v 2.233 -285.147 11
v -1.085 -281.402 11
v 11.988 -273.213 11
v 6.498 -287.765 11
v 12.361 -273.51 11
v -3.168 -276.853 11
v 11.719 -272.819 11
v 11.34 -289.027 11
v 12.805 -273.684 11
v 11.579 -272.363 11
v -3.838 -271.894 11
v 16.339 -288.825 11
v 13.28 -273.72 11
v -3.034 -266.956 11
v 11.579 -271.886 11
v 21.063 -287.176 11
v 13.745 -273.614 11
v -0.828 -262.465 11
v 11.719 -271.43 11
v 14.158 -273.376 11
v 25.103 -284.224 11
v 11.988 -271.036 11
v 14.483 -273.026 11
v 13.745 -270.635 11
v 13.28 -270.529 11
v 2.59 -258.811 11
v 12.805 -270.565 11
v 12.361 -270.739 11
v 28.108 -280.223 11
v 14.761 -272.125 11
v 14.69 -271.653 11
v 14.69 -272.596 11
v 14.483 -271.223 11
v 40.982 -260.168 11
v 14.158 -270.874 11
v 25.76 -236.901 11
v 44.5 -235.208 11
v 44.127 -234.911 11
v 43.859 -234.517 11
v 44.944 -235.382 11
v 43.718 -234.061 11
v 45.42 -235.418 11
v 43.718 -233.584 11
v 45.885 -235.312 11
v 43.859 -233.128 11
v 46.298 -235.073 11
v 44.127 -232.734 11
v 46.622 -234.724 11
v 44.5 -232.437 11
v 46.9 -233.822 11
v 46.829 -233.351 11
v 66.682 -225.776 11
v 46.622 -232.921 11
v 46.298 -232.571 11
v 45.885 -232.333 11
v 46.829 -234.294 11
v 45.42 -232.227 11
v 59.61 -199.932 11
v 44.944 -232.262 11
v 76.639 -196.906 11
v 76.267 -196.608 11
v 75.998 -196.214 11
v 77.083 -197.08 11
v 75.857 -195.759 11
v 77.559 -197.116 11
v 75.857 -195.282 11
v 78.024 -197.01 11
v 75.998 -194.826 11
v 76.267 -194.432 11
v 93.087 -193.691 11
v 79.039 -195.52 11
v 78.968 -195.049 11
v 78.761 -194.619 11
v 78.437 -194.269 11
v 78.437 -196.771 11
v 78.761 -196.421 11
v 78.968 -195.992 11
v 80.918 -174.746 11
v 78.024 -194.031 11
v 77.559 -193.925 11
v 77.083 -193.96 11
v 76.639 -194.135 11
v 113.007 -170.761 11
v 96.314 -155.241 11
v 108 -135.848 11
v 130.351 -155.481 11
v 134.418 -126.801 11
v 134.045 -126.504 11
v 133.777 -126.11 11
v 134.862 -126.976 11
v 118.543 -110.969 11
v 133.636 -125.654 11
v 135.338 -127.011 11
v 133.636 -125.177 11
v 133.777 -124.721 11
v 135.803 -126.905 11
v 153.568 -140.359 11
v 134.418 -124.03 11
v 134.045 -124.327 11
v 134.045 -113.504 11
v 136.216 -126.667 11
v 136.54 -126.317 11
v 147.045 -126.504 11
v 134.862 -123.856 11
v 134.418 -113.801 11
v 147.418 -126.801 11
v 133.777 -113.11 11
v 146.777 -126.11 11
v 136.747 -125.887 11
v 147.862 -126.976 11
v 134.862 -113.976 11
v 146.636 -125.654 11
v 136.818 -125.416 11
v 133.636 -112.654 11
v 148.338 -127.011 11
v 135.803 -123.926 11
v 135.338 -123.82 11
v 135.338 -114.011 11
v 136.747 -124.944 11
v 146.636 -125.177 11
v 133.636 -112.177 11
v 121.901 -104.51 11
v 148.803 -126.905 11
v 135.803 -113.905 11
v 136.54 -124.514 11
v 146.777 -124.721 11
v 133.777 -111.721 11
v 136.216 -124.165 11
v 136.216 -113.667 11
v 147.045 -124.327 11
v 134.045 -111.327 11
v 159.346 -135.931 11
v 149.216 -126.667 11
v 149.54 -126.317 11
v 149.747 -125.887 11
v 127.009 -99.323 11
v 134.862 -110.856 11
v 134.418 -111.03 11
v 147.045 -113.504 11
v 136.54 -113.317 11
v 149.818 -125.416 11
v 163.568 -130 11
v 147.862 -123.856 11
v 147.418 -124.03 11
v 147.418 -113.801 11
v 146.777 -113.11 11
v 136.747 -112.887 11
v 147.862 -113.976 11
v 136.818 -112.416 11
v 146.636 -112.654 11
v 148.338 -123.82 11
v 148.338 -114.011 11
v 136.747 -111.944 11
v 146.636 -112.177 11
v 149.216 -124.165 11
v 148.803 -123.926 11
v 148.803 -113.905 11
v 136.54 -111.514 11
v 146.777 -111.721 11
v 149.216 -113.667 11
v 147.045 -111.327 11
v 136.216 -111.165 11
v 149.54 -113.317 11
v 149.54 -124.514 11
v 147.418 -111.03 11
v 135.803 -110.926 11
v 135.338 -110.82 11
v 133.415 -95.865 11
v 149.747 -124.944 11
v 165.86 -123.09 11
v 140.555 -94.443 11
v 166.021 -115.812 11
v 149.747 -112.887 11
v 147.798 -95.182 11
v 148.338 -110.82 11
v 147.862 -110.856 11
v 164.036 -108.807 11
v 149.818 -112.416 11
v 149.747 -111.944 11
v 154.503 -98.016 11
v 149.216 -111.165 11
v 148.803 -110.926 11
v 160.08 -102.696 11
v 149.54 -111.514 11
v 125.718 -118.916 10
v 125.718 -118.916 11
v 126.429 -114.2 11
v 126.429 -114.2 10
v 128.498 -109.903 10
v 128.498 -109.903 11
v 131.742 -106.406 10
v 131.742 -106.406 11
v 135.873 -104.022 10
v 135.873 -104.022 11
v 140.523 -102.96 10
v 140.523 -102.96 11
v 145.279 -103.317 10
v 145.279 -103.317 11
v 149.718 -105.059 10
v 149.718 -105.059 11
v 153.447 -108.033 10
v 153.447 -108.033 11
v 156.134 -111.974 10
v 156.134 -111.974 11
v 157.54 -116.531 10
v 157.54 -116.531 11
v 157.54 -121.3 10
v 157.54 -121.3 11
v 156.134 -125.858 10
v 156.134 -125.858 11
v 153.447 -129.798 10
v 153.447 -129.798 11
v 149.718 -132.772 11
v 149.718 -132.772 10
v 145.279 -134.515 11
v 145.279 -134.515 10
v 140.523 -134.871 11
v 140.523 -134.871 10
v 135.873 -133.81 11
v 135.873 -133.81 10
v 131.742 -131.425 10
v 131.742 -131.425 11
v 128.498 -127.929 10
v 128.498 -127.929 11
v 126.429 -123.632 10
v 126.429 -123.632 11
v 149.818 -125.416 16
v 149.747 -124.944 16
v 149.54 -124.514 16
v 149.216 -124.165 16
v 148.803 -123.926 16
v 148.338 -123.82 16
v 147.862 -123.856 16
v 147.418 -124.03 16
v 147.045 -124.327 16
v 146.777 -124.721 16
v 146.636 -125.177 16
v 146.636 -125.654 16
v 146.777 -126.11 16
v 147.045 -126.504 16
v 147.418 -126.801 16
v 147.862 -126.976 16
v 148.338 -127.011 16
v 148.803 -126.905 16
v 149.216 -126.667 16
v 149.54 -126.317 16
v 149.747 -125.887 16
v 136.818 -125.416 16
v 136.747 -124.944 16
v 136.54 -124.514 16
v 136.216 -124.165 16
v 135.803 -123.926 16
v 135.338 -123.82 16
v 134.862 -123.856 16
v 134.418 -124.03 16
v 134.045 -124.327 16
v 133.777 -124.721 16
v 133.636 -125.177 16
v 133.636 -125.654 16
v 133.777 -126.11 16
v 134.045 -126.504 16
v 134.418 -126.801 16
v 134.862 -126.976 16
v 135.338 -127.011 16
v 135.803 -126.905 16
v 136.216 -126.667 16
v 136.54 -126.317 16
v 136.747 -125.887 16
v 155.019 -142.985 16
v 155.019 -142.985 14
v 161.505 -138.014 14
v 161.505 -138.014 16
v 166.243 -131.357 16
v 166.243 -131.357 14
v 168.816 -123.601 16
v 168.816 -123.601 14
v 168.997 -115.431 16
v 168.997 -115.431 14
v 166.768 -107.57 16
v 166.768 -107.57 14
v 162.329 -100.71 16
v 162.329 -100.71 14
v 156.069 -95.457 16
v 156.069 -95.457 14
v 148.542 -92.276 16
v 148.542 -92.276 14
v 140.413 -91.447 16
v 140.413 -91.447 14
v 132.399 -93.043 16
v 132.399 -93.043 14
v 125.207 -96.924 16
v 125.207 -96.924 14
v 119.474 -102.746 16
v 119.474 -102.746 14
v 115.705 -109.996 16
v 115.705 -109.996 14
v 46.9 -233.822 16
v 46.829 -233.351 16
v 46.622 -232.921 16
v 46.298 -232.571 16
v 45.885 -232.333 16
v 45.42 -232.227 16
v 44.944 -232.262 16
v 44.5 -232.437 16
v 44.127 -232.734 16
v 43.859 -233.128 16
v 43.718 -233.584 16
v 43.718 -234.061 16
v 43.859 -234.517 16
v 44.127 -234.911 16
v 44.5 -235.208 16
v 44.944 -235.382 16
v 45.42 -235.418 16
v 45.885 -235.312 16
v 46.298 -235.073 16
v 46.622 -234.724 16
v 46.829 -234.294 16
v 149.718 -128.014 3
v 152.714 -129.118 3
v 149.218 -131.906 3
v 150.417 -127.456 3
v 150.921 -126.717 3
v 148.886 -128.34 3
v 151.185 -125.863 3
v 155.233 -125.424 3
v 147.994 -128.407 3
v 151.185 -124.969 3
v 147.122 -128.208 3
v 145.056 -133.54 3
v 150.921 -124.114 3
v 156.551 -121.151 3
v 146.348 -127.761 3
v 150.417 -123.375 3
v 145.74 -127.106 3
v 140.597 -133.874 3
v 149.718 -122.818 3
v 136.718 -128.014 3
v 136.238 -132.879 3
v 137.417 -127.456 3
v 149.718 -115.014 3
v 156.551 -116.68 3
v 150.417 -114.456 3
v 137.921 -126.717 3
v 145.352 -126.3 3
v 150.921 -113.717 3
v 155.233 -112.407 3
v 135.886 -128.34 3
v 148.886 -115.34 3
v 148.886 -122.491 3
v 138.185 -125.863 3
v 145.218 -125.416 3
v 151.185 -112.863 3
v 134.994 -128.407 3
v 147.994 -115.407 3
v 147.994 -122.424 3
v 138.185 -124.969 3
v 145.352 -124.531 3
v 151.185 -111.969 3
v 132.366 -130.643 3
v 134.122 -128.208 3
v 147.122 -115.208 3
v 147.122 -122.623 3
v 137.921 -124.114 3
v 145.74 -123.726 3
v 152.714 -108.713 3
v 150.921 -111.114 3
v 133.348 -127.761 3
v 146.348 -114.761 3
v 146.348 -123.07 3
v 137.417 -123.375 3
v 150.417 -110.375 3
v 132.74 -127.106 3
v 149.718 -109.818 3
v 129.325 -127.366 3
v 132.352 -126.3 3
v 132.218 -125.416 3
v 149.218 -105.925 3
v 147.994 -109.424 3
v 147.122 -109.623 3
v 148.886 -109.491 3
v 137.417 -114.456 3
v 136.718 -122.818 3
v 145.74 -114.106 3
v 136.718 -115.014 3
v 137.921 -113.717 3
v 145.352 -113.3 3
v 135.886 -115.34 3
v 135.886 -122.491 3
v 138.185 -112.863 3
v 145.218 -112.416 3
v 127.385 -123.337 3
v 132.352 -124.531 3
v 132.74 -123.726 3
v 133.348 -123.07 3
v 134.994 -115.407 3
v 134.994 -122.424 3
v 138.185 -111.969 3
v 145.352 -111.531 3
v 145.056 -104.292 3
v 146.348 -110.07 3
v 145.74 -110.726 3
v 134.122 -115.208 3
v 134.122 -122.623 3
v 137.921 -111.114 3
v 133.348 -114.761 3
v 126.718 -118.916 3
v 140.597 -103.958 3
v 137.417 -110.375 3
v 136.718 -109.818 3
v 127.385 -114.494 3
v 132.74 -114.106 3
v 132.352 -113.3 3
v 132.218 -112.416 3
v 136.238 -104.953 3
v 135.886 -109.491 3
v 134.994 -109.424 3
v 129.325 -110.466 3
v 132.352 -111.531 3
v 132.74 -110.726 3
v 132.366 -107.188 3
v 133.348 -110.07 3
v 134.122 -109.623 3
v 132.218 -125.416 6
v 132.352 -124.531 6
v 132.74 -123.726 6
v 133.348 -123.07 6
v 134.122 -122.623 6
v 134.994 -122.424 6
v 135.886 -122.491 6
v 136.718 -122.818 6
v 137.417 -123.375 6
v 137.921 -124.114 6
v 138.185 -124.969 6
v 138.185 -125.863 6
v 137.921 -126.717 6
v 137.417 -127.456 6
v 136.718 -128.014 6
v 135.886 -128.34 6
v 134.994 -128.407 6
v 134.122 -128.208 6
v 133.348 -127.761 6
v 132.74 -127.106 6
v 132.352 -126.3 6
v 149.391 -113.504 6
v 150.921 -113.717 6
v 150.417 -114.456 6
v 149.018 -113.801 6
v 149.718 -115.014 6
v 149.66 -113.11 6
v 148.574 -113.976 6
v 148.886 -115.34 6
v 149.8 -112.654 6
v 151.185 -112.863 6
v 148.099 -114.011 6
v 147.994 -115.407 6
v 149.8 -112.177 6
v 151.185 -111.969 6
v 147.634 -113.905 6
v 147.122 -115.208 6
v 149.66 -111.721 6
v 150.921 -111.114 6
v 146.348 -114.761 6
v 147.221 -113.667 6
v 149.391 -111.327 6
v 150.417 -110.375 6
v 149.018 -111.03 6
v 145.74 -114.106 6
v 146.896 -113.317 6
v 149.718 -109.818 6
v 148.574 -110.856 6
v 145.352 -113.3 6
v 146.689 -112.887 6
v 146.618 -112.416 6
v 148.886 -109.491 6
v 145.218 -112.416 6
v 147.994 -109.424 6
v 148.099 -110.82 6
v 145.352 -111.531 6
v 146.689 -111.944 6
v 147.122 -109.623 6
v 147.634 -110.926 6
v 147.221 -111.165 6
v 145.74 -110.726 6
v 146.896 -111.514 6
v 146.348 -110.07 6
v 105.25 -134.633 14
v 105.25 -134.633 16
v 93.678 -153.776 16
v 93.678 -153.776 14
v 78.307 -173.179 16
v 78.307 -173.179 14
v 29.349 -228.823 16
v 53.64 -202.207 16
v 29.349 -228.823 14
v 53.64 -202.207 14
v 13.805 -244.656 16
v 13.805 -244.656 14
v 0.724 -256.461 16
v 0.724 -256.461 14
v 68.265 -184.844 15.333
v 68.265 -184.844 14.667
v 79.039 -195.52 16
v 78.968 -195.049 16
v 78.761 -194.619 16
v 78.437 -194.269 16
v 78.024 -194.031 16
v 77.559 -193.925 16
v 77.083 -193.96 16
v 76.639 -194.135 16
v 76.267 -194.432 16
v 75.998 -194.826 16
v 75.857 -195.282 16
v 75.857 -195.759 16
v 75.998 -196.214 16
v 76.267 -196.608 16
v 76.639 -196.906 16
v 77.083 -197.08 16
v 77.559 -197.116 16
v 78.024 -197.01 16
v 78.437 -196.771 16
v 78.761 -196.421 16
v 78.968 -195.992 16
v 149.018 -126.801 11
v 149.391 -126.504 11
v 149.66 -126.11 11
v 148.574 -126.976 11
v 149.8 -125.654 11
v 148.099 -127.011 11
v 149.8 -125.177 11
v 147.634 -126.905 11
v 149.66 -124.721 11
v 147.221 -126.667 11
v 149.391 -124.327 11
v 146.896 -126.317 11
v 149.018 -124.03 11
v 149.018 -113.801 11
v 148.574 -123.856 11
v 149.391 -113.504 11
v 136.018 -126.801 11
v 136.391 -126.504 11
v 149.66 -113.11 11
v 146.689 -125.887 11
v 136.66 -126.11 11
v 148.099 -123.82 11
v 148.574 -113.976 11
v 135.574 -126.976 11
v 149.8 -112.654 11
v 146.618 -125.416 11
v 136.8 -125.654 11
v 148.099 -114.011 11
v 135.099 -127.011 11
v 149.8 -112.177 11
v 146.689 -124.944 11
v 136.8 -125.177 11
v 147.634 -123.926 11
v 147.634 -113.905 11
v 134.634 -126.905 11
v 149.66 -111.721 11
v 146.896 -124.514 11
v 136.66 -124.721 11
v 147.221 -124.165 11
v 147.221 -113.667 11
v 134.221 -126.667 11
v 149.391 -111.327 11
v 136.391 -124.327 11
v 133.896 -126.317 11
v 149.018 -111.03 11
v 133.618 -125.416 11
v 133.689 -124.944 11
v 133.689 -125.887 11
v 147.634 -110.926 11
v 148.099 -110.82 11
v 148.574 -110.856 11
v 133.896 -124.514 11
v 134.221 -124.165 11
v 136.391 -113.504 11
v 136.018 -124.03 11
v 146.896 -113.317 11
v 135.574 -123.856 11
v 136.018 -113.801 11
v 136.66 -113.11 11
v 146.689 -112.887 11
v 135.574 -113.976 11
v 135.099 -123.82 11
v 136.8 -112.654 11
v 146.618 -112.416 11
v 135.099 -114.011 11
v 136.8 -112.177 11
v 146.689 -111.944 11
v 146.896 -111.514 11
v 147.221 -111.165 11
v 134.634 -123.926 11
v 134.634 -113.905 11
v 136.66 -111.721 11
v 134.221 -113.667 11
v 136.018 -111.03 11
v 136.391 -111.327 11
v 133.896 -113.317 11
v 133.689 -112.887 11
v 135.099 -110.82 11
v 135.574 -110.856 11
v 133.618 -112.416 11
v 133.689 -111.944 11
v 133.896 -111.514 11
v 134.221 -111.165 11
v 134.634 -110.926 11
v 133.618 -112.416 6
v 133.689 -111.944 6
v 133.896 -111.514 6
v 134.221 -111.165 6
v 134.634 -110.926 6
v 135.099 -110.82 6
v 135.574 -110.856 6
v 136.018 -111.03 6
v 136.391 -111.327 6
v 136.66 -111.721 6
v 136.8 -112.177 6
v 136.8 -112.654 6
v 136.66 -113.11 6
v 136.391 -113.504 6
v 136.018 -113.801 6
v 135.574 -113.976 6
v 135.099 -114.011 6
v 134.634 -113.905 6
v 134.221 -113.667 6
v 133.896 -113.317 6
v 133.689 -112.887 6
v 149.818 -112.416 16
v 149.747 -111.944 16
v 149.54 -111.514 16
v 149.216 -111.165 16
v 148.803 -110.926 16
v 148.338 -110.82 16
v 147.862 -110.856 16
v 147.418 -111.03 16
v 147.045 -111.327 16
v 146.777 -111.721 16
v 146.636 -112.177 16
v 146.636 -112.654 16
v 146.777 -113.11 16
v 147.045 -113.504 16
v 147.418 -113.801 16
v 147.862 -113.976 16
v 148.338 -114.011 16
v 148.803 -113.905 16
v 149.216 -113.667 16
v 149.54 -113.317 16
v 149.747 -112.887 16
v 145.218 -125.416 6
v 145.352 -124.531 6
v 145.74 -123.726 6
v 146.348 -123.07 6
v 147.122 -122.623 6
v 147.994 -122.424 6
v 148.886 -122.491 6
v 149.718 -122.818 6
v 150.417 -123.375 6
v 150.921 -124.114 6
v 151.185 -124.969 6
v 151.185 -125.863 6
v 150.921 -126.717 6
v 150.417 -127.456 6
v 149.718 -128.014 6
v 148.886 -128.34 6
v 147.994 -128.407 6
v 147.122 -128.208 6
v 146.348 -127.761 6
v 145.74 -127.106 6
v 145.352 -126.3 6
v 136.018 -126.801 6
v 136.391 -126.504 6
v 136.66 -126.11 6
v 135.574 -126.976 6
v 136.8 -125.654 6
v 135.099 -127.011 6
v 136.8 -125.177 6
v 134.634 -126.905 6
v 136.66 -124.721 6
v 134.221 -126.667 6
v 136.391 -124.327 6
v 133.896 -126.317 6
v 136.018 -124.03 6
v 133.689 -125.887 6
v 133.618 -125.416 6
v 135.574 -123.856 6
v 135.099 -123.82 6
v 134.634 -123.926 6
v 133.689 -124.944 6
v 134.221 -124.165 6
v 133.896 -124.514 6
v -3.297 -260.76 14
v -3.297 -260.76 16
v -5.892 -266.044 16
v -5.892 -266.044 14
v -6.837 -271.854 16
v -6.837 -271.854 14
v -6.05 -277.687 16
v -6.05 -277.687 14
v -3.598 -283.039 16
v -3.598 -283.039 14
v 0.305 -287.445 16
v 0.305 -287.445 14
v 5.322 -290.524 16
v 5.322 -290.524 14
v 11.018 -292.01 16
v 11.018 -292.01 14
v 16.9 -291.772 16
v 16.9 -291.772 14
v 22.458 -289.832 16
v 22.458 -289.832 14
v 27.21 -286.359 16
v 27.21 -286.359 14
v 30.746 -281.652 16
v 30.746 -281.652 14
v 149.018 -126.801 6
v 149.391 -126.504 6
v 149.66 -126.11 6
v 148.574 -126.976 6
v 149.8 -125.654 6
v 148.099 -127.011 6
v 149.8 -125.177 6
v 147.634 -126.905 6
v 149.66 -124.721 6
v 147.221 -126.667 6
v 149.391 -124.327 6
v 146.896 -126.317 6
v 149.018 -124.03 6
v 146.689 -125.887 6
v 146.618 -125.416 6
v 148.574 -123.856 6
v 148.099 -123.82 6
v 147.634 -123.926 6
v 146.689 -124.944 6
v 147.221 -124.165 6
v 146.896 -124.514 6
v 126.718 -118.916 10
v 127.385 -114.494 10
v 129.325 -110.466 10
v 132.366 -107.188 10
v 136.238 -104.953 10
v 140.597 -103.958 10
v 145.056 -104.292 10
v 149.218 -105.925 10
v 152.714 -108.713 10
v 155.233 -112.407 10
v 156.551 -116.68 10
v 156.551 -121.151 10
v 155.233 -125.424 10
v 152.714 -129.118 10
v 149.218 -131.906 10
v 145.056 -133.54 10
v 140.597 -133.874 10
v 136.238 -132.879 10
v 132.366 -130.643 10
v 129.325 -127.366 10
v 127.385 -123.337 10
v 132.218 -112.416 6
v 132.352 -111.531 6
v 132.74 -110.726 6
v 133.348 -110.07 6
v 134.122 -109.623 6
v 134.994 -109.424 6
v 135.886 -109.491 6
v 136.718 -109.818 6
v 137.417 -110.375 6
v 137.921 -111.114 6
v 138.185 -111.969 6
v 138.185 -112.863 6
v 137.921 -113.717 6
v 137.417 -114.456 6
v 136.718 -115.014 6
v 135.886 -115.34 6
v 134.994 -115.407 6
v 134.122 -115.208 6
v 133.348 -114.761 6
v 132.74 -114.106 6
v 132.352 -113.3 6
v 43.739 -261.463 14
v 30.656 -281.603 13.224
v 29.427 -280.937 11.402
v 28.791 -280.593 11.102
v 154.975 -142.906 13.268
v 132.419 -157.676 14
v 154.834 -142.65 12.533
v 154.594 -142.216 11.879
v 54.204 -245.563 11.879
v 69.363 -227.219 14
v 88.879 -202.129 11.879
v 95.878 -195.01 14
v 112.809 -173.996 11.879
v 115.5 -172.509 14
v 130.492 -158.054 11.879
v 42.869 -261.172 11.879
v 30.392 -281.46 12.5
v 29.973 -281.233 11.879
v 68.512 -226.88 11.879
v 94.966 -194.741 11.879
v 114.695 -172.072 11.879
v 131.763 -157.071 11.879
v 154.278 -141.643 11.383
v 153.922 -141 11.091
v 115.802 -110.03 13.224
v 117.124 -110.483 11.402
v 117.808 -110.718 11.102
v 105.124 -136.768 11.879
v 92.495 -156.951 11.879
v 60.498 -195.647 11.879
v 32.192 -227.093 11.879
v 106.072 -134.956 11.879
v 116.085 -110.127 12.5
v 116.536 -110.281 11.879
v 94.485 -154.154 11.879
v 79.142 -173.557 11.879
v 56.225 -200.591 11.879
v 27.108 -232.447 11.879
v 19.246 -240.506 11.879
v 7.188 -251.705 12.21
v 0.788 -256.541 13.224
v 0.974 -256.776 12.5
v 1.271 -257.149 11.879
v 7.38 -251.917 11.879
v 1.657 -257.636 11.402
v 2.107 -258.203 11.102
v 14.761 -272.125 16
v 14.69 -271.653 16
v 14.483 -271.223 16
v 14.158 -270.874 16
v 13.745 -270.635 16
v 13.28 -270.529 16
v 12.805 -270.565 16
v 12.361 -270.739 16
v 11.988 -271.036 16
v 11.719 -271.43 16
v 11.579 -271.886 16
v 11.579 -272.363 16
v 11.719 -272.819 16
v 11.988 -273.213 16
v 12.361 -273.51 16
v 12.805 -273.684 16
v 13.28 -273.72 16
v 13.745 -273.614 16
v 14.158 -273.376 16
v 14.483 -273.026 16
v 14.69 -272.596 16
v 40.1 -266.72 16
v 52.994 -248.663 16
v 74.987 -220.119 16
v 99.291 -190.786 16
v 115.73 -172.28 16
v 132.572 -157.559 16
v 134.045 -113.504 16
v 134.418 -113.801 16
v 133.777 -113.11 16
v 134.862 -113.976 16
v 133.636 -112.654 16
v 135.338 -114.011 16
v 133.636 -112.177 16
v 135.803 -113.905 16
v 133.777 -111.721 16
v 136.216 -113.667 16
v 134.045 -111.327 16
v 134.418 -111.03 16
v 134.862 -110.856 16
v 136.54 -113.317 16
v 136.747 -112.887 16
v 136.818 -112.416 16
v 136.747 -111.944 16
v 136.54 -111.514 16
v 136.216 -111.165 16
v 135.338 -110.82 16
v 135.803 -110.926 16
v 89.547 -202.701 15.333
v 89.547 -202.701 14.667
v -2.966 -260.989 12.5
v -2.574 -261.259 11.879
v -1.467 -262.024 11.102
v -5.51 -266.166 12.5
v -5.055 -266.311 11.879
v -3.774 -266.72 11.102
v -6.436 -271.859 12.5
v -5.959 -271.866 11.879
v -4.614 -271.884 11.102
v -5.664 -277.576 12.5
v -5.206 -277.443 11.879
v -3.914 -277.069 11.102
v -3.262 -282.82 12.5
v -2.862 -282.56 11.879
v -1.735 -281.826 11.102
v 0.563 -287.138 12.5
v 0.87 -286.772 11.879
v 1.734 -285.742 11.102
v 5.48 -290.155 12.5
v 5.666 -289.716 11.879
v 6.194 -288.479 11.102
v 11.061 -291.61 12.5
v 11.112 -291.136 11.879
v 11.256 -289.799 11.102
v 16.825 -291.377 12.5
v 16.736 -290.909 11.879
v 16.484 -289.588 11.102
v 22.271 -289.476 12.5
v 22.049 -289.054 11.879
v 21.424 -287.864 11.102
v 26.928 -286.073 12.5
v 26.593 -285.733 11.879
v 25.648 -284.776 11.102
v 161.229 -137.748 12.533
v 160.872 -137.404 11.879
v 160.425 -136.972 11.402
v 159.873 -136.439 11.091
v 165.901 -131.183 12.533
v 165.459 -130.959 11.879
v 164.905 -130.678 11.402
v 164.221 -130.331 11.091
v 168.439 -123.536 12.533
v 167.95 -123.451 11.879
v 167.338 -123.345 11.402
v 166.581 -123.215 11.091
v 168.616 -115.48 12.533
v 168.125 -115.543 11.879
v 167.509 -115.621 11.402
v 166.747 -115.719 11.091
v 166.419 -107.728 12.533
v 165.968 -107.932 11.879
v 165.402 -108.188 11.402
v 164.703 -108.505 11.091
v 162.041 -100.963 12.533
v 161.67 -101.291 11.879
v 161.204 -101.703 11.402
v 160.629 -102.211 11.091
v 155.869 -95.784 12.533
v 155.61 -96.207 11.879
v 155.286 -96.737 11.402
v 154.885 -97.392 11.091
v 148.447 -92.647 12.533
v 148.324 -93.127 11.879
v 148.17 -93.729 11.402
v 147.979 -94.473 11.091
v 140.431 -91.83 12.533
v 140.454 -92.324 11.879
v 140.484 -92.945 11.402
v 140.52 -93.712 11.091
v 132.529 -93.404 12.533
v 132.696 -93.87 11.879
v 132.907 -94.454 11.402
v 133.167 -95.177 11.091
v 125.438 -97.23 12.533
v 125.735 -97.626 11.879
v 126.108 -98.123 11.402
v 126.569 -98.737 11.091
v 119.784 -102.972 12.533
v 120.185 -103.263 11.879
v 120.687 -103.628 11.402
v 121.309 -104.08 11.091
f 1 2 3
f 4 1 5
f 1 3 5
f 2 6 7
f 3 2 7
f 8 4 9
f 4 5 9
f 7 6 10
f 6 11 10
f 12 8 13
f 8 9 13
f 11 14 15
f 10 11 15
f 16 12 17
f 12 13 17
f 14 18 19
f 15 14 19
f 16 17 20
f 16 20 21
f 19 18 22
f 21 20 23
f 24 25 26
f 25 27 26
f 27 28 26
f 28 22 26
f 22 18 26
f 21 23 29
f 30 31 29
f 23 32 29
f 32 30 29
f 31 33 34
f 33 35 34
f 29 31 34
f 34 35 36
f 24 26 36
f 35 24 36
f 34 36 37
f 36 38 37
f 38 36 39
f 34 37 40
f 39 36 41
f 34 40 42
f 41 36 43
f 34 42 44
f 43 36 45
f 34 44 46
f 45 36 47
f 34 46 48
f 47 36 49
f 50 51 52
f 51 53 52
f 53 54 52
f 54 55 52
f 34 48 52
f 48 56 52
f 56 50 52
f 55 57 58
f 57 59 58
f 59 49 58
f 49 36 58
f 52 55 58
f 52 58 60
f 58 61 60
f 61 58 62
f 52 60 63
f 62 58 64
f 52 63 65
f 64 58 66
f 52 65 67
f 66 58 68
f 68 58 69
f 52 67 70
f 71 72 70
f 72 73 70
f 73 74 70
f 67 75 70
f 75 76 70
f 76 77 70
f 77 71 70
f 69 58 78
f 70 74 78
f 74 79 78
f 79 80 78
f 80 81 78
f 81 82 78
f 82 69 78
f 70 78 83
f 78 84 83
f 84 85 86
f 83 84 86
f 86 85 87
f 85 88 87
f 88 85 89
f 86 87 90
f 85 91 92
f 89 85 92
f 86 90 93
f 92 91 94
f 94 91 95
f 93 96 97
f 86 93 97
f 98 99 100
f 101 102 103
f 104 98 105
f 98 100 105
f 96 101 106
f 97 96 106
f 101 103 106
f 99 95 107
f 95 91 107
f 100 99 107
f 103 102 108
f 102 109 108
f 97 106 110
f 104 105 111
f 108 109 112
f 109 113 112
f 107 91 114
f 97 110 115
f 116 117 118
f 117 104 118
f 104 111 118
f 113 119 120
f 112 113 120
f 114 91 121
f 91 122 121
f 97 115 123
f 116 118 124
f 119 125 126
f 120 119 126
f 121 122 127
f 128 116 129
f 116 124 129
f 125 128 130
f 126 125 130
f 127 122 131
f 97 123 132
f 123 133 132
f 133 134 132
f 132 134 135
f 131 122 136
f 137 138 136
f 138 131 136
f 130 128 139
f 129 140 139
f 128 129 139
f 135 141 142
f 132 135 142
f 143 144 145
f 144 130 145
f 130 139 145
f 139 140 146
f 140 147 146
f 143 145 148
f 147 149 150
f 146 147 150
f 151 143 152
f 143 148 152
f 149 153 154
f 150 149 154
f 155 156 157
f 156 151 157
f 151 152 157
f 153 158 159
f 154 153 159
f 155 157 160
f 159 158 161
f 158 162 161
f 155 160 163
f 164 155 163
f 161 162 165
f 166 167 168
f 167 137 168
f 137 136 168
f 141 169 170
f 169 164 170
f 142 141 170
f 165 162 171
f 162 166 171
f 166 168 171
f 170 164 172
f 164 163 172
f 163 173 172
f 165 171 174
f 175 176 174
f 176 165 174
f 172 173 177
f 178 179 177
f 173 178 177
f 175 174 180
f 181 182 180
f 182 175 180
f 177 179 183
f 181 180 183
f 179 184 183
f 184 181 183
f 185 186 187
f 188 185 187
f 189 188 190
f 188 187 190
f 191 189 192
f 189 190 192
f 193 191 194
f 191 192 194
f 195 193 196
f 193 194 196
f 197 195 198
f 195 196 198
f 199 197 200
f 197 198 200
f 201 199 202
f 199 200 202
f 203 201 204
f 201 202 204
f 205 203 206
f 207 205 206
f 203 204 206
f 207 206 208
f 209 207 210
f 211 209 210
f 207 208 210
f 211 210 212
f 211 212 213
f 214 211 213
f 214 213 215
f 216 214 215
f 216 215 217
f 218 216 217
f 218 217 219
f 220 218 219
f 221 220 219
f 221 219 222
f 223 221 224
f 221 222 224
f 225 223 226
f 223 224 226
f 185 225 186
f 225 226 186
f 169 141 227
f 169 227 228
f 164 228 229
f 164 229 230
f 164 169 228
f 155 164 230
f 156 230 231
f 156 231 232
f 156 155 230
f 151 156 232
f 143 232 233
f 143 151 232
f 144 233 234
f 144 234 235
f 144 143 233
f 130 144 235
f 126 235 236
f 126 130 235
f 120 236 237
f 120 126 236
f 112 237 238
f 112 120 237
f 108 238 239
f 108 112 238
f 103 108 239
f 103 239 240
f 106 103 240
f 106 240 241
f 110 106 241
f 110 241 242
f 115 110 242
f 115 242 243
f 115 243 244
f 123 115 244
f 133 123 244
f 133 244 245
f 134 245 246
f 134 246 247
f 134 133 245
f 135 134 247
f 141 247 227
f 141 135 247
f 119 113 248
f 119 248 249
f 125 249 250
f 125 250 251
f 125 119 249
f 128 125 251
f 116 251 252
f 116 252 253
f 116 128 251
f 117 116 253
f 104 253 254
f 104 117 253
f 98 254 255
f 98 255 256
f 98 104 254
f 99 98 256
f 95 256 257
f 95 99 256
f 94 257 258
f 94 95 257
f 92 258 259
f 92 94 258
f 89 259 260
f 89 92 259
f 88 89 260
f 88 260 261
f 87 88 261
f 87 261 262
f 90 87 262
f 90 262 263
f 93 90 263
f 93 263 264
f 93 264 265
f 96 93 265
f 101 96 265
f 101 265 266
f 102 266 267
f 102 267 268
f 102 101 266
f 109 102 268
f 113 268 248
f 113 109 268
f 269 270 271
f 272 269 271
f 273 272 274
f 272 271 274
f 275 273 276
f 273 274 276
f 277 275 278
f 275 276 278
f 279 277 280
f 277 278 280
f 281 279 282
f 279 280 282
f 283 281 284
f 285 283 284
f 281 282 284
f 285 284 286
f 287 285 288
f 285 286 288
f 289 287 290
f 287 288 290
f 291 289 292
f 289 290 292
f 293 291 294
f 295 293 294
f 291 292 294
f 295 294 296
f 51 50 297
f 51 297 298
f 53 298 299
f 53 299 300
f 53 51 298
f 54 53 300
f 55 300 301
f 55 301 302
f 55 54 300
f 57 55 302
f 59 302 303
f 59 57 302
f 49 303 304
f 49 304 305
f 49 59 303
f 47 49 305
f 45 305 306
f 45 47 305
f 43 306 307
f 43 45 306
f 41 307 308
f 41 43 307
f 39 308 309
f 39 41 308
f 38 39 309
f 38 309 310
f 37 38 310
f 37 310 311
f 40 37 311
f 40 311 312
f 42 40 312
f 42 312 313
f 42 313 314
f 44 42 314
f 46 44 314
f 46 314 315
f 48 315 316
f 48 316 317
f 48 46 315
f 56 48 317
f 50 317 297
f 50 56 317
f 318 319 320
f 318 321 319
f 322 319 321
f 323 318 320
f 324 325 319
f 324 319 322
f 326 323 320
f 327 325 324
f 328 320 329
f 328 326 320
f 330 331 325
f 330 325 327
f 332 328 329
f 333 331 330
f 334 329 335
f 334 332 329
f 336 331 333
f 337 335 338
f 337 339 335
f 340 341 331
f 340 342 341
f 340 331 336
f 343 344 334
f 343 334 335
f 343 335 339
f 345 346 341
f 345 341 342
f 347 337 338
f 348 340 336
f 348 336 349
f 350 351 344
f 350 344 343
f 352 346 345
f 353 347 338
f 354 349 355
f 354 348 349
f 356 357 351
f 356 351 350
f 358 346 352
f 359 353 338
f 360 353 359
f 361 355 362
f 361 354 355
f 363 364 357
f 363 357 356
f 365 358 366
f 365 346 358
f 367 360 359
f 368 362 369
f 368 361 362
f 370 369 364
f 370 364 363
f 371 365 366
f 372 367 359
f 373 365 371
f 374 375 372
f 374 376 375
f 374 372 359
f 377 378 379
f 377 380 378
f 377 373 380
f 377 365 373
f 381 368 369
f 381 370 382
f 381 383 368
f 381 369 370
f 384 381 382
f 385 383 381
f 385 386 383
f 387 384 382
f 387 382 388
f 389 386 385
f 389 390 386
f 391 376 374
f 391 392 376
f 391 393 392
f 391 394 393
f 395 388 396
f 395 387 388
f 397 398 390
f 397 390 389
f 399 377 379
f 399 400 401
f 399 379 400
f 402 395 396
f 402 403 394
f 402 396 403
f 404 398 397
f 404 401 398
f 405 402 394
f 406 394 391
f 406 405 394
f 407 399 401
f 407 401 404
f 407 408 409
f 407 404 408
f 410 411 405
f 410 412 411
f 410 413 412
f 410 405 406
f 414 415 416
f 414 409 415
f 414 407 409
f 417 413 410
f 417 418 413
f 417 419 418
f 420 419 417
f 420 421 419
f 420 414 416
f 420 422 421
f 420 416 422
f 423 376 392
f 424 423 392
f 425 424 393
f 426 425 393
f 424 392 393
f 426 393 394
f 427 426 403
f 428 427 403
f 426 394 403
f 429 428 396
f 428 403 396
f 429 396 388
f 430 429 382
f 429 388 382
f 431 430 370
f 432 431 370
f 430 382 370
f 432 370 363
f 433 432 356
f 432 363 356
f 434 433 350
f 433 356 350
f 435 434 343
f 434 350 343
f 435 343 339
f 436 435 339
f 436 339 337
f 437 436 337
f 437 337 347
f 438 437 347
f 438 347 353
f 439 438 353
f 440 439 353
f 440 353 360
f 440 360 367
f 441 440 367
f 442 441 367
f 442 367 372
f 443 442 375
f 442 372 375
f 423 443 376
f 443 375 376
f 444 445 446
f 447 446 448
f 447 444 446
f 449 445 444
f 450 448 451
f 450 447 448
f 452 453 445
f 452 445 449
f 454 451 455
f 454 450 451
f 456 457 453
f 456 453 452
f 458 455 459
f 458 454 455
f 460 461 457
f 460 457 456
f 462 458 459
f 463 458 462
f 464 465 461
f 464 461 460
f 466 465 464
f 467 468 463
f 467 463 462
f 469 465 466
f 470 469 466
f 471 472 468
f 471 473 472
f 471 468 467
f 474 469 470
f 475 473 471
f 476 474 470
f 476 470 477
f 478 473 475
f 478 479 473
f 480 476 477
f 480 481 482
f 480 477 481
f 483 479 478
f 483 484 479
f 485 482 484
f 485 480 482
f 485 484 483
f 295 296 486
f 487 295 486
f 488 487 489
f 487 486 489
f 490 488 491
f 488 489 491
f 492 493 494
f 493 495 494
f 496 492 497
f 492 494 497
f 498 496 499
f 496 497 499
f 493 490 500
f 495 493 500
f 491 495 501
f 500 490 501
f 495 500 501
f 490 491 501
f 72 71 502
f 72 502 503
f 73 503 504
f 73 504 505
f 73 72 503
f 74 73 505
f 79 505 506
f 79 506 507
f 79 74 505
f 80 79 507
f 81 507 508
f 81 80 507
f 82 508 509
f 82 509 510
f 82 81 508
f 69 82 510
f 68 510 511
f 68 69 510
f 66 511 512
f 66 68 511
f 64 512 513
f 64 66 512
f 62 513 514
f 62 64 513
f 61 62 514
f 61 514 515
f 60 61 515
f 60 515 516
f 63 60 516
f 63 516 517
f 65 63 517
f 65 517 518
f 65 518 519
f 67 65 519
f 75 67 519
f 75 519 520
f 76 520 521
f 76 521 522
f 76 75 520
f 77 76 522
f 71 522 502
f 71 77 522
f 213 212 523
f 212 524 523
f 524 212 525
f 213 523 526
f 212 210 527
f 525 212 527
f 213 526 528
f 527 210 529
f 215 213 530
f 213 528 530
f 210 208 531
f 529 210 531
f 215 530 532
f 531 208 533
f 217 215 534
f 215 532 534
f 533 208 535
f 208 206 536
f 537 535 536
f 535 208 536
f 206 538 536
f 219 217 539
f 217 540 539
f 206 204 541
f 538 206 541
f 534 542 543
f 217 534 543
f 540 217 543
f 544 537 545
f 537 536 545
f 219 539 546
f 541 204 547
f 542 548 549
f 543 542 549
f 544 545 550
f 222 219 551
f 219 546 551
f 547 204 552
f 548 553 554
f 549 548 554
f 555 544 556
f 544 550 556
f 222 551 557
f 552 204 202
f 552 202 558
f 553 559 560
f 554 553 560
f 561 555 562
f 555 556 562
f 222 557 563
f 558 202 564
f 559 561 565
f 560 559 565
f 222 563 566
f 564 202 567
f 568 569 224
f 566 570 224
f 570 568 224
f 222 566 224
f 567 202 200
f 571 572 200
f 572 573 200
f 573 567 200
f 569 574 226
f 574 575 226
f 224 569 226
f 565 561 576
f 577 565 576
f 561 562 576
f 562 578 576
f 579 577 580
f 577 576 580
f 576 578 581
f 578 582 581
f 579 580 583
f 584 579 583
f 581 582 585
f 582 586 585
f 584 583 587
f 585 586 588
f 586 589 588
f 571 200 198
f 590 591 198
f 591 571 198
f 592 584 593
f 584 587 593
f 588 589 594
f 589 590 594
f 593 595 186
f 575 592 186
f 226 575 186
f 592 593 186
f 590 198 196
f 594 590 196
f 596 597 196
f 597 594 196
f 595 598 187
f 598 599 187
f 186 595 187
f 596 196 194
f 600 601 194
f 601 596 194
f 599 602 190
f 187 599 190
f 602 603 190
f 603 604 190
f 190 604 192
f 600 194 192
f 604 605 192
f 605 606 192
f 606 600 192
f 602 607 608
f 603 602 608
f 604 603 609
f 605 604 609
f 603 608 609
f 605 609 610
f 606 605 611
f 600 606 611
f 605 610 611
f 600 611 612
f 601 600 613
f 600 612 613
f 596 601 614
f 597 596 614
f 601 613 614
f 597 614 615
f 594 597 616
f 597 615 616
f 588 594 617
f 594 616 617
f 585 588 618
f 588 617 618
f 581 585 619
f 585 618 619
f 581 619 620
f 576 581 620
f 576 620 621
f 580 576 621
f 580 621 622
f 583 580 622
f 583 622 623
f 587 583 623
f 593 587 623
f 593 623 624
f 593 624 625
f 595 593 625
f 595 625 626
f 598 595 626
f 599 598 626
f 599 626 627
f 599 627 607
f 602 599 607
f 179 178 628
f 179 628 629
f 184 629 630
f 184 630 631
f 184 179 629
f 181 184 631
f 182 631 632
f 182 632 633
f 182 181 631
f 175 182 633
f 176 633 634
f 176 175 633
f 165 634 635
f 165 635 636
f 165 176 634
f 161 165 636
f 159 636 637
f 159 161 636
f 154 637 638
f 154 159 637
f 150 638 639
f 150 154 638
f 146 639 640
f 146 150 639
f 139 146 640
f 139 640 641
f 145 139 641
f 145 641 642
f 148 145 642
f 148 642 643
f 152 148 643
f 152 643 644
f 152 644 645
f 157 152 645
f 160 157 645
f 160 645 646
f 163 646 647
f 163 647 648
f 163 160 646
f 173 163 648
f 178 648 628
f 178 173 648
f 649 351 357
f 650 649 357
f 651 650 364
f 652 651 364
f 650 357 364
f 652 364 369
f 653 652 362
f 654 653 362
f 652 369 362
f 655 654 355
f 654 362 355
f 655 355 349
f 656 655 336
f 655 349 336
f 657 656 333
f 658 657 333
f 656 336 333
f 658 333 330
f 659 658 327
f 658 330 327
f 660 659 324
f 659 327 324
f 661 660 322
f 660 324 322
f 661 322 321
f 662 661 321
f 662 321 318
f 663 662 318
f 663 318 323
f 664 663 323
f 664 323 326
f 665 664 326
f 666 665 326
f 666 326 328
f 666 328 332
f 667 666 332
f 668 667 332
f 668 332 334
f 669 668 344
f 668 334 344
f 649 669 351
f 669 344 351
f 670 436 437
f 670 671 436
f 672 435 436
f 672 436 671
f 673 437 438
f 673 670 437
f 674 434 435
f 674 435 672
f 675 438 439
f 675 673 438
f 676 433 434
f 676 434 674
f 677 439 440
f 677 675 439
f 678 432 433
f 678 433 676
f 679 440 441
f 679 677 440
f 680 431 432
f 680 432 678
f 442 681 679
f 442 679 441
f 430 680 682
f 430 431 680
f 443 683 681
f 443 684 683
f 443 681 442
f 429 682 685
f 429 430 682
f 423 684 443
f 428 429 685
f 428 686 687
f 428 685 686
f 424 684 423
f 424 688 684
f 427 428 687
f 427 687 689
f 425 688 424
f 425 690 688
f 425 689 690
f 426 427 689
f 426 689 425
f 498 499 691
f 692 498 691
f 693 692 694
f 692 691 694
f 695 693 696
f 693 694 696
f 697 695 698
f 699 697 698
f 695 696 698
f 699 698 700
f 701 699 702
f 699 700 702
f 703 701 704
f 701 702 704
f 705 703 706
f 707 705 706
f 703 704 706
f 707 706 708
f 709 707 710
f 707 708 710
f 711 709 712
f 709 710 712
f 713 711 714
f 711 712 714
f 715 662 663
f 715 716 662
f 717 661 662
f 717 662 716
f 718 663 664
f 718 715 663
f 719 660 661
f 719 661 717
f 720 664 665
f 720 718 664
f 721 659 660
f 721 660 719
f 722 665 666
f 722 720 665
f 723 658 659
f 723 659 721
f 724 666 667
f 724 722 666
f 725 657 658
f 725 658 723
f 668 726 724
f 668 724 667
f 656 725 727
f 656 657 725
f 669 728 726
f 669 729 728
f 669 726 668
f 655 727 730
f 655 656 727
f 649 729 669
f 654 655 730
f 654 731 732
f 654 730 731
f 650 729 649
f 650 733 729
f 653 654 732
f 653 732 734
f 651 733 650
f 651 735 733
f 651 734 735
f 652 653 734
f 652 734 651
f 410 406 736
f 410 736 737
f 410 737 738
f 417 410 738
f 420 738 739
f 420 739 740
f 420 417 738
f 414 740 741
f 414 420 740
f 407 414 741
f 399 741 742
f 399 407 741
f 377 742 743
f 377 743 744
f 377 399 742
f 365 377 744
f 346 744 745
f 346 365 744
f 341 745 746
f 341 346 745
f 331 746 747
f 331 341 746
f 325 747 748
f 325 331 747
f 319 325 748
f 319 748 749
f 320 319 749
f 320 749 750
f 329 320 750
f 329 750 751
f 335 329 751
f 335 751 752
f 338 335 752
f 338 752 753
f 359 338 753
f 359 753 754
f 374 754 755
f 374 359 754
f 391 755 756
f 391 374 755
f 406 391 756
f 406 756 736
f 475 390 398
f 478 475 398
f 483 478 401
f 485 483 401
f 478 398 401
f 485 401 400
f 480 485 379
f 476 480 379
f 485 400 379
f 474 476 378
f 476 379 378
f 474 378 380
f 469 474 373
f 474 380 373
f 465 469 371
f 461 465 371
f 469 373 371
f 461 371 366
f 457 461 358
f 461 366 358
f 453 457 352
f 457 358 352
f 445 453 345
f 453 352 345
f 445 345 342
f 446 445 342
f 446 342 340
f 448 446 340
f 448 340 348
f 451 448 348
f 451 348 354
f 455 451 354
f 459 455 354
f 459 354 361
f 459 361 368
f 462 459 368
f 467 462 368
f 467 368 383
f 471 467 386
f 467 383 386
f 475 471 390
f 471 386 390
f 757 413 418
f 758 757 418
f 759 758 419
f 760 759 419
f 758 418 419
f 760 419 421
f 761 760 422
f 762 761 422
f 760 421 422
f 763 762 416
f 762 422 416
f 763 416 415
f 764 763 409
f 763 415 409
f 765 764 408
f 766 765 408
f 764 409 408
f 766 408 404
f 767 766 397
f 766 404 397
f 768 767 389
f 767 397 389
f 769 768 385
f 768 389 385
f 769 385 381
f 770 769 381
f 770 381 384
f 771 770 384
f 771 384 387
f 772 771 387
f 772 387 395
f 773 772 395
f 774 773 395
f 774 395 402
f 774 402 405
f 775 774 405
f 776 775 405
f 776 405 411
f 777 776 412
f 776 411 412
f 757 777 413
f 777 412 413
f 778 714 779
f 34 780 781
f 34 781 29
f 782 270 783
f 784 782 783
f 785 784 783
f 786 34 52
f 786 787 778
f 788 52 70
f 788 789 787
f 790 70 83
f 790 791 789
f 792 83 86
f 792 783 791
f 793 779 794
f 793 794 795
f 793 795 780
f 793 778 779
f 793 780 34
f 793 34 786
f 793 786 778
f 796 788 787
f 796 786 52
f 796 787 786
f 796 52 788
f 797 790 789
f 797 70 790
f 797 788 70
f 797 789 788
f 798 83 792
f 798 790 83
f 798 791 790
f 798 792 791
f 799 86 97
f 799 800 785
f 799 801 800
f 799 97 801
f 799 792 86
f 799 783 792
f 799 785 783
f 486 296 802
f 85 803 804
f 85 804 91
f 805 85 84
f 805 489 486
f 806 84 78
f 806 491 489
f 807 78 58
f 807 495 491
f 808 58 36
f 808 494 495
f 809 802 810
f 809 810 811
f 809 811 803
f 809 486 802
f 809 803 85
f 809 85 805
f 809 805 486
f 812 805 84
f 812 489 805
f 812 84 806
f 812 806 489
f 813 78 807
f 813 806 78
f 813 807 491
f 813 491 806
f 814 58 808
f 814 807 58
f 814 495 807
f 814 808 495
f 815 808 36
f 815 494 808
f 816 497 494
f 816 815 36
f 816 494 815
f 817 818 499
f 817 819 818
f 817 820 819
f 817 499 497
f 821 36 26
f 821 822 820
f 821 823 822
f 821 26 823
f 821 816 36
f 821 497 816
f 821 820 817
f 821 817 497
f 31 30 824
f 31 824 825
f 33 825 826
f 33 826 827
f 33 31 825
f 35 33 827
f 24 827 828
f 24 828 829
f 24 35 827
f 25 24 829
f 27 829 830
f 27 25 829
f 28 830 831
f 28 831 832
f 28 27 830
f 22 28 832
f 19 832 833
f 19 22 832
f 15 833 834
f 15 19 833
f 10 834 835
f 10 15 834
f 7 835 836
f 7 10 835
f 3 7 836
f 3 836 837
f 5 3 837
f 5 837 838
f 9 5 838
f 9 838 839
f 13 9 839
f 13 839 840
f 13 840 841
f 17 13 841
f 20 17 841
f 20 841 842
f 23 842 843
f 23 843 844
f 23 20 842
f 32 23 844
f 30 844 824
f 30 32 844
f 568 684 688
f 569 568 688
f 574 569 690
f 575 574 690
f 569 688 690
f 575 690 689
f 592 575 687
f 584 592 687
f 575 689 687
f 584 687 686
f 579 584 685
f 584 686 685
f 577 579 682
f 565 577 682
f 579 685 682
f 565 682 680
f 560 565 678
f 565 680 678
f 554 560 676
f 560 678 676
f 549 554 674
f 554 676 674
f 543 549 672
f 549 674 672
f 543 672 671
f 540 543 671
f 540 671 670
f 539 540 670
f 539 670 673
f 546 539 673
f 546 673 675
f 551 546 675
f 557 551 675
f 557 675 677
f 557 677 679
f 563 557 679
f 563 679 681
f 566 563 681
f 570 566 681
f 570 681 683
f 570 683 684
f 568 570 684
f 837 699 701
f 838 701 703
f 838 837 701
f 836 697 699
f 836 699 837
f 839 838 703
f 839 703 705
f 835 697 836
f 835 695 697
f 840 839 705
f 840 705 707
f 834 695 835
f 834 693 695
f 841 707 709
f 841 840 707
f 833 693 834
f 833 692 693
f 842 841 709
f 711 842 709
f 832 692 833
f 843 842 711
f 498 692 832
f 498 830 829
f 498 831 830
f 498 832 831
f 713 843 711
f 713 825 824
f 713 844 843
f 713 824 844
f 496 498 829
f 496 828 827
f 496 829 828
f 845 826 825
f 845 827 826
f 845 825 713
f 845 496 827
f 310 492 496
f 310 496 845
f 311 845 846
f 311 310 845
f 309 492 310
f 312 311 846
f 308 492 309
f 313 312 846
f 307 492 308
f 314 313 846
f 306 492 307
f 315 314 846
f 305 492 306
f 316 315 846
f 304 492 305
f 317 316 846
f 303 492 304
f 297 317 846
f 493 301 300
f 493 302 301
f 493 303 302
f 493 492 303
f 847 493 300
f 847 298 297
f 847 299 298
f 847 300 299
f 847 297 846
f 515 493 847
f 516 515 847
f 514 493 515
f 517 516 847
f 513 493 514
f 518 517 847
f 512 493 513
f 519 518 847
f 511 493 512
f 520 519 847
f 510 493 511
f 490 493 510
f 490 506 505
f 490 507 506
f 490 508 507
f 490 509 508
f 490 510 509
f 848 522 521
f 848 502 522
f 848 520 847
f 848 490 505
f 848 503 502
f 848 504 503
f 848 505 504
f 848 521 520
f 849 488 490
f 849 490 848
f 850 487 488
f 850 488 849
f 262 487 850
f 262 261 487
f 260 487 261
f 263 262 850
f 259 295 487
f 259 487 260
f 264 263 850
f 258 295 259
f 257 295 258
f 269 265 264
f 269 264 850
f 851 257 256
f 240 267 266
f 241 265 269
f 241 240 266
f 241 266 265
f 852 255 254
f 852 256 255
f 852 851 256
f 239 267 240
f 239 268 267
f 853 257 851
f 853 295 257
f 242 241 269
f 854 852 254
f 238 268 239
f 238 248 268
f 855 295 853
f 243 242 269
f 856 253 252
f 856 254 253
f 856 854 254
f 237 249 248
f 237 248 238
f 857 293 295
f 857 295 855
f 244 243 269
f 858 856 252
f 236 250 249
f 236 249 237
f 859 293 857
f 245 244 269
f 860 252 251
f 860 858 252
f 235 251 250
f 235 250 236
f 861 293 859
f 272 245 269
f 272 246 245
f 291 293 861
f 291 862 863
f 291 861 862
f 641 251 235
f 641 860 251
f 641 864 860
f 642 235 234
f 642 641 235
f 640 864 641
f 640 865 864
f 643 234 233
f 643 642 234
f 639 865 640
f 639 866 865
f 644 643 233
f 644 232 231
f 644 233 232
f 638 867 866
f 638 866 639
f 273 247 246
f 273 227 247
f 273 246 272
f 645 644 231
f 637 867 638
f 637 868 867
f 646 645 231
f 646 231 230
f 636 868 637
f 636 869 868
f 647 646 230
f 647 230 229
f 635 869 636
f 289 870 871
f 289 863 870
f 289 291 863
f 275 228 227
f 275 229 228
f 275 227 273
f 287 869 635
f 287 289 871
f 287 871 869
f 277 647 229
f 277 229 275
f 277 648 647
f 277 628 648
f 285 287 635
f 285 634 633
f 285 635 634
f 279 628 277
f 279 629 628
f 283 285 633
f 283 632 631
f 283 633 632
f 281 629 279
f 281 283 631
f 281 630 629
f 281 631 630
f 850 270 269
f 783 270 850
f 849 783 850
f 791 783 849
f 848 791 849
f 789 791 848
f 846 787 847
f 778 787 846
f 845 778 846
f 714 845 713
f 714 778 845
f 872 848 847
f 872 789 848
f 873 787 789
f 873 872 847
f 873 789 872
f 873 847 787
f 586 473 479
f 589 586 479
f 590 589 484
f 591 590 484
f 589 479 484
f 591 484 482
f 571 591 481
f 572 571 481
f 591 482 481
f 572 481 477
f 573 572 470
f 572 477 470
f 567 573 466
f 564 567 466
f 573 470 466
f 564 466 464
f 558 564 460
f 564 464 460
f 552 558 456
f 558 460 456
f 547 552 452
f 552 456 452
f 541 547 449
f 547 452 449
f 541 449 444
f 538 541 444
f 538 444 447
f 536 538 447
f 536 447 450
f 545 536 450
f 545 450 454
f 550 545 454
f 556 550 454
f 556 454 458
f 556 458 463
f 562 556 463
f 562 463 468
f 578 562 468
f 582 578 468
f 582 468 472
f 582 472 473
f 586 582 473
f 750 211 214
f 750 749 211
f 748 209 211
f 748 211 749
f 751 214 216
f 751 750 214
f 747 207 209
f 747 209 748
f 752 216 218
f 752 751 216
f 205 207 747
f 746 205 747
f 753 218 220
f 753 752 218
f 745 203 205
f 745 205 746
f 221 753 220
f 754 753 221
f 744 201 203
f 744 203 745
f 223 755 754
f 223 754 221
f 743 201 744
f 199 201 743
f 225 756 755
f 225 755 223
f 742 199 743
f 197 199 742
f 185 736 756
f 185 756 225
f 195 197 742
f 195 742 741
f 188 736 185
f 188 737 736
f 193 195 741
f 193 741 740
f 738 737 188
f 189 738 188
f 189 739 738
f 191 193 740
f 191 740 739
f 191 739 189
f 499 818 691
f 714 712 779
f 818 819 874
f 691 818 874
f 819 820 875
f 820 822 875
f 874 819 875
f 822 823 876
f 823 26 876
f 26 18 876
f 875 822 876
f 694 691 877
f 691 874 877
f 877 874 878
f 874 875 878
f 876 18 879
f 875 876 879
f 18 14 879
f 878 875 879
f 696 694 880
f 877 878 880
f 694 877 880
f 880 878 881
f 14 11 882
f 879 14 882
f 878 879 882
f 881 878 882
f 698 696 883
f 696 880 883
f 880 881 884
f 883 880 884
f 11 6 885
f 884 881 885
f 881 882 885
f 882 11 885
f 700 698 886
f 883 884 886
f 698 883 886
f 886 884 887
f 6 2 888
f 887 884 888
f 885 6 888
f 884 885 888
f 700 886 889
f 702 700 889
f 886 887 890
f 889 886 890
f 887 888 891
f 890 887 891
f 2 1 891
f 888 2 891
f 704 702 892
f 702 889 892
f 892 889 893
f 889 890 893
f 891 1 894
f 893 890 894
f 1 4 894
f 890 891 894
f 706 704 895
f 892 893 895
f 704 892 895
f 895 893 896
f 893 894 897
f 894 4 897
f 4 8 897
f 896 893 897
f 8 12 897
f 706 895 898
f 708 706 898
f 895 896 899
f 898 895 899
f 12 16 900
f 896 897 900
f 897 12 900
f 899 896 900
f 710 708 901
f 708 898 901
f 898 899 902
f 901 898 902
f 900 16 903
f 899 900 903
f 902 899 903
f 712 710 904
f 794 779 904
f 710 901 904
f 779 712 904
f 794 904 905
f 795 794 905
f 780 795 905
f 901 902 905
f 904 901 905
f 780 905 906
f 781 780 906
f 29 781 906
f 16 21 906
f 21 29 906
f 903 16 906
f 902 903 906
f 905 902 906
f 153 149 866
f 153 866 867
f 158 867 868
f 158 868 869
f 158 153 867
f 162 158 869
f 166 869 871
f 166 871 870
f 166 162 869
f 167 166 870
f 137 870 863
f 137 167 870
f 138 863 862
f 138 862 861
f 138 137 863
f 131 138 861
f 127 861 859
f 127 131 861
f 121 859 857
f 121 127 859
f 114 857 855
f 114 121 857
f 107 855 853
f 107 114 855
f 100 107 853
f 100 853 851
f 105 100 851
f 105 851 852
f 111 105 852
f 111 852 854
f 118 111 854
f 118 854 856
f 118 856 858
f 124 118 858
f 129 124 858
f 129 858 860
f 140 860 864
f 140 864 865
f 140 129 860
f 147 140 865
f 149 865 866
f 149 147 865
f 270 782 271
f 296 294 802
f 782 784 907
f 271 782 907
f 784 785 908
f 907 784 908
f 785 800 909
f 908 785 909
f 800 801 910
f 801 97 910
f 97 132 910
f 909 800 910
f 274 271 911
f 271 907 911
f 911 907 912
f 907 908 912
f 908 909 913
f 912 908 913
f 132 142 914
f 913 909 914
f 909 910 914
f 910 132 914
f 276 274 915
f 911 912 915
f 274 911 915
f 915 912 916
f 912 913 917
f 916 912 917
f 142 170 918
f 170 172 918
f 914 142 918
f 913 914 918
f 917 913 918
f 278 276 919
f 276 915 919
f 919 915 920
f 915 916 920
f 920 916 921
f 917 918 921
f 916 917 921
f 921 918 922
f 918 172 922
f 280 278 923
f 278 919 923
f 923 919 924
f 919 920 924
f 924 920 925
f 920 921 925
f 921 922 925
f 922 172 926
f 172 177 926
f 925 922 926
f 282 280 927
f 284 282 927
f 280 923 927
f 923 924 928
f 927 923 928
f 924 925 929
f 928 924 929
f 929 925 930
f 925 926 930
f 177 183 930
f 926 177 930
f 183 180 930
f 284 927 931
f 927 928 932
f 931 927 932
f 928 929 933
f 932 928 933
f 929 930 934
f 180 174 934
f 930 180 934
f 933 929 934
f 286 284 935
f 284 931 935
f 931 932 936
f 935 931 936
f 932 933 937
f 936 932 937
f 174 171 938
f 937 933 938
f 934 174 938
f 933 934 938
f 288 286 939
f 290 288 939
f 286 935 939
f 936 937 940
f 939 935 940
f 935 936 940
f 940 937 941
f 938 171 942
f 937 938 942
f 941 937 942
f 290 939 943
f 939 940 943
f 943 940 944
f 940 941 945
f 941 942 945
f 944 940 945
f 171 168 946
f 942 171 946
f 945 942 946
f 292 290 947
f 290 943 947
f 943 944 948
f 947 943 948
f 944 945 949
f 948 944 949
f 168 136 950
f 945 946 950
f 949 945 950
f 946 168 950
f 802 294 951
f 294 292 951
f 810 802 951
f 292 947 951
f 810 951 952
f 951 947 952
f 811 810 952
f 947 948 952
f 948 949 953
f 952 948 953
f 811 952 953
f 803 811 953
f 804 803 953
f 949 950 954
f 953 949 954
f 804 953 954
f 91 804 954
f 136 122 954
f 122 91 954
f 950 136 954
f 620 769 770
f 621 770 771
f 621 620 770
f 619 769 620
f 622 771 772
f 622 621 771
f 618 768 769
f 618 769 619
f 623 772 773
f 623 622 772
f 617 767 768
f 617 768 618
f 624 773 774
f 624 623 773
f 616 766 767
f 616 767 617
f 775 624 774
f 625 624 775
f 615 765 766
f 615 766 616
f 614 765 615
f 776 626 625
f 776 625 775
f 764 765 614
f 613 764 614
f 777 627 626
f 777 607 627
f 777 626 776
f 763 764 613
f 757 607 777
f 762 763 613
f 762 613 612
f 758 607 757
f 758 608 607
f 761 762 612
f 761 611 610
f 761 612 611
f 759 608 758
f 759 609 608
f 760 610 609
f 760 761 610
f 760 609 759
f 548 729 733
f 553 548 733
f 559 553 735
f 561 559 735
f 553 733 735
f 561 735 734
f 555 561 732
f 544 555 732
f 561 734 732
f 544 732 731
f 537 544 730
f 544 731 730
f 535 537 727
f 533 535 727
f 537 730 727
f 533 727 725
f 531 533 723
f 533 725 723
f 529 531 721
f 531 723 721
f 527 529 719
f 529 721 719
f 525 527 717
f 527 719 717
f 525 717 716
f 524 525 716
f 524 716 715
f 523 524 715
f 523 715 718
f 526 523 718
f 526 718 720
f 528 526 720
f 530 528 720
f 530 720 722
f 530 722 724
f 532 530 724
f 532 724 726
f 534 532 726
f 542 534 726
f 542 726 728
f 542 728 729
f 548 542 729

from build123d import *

# Parameters (mm, degrees)
SKETCH1_R           = 1.6
BOSS_EXTRUDE1_DEPTH = 5
SKETCH2_R           = 16
SKETCH2_R_2         = 1.6
BOSS_EXTRUDE2_DEPTH = 1
BOSS_EXTRUDE3_START = 7
SKETCH3_R           = 15
SKETCH3_R_2         = 1.6
BOSS_EXTRUDE3_DEPTH = 7
SKETCH4_R           = 3
CUT_EXTRUDE1_DEPTH  = 3
VARFILLET2_R        = 3


with BuildPart() as part:
    # Sketch1 → Boss-Extrude1 (new body)
    with BuildSketch(Plane.XY.offset(11)):
        with BuildLine():
            ThreePointArc((155.019115612, -142.985112199), (159.394881243, -97.849485606), (115.704809966, -109.996492831))
            add(Edge.make_bspline(
                [(115.704809966, -109.996492831), (101.94879758, -150.116707379), (78.178790791, -171.772825461), (58.717079478, -197.082387325), (16.356999542, -244.049515564), (0.72448619, -256.46124476)],
                knots=[0, 0, 0, 0, 0.619090324, 0.719090324, 1, 1, 1, 1], degree=3))
            ThreePointArc((0.72448619, -256.46124476), (0.304947846, -287.445485278), (30.74561606, -281.651963762))
            add(Edge.make_bspline(
                [(155.019115612, -142.985112199), (117.897123756, -163.498941991), (100.69762913, -190.668374405), (79.152067085, -214.229377889), (40.254225745, -264.101669257), (30.74561606, -281.651963762)],
                knots=[0, 0, 0, 0, 0.619090324, 0.719090324, 1, 1, 1, 1], degree=3))
        make_face()
        with Locations((135.218221977, -112.415707792)):
            Circle(SKETCH1_R, mode=Mode.SUBTRACT)
        with Locations((148.218221977, -112.415707792)):
            Circle(SKETCH1_R, mode=Mode.SUBTRACT)
        with Locations((148.218221977, -125.415707792)):
            Circle(SKETCH1_R, mode=Mode.SUBTRACT)
        with Locations((135.218221977, -125.415707792)):
            Circle(SKETCH1_R, mode=Mode.SUBTRACT)
        with Locations((77.439461008, -195.520152104)):
            Circle(SKETCH1_R, mode=Mode.SUBTRACT)
        with Locations((45.300080524, -233.82237426)):
            Circle(SKETCH1_R, mode=Mode.SUBTRACT)
        with Locations((13.16070004, -272.124596416)):
            Circle(SKETCH1_R, mode=Mode.SUBTRACT)
    extrude(amount=BOSS_EXTRUDE1_DEPTH)

    # VarFillet2
    varfillet2_edges = [part.edges().sort_by_distance(p)[0] for p in [
        (65.360846316, -188.427744165, 11),
        (86.521548764, -206.183681785, 11),
    ]]
    fillet(varfillet2_edges, radius=VARFILLET2_R)


with BuildPart() as body_2:
    # Sketch2 → Boss-Extrude2 (new body)
    with BuildSketch(Plane(origin=(0, 0, 11), x_dir=(-1, 0, 0), z_dir=(0, 0, -1))):
        with Locations((-141.718221977, -118.915707792)):
            Circle(SKETCH2_R)
        with Locations((-148.218221977, -125.415707792)):
            Circle(SKETCH2_R_2, mode=Mode.SUBTRACT)
        with Locations((-135.218221977, -125.415707792)):
            Circle(SKETCH2_R_2, mode=Mode.SUBTRACT)
        with Locations((-148.218221977, -112.415707792)):
            Circle(SKETCH2_R_2, mode=Mode.SUBTRACT)
        with Locations((-135.218221977, -112.415707792)):
            Circle(SKETCH2_R_2, mode=Mode.SUBTRACT)
    extrude(amount=BOSS_EXTRUDE2_DEPTH)

    # Sketch3 → Boss-Extrude3 (add)
    with BuildSketch(Plane(origin=(0, 0, 10), x_dir=(-1, 0, 0), z_dir=(0, 0, -1)).offset(BOSS_EXTRUDE3_START)):
        with Locations((-141.718221977, -118.915707792)):
            Circle(SKETCH3_R)
        with Locations((-148.218221977, -125.415707792)):
            Circle(SKETCH3_R_2, mode=Mode.SUBTRACT)
        with Locations((-135.218221977, -125.415707792)):
            Circle(SKETCH3_R_2, mode=Mode.SUBTRACT)
        with Locations((-148.218221977, -112.415707792)):
            Circle(SKETCH3_R_2, mode=Mode.SUBTRACT)
        with Locations((-135.218221977, -112.415707792)):
            Circle(SKETCH3_R_2, mode=Mode.SUBTRACT)
    extrude(amount=-BOSS_EXTRUDE3_DEPTH)

    # Sketch4 → Cut-Extrude1 (cut)
    with BuildSketch(Plane(origin=(0, 0, 3), x_dir=(-1, 0, 0), z_dir=(0, 0, -1))):
        with Locations((-148.218221977, -112.415707792)):
            Circle(SKETCH4_R)
        with Locations((-135.218221977, -112.415707792)):
            Circle(SKETCH4_R)
        with Locations((-135.218221977, -125.415707792)):
            Circle(SKETCH4_R)
        with Locations((-148.218221977, -125.415707792)):
            Circle(SKETCH4_R)
    extrude(amount=-CUT_EXTRUDE1_DEPTH, mode=Mode.SUBTRACT)


solid = Compound([part.part, body_2.part])
